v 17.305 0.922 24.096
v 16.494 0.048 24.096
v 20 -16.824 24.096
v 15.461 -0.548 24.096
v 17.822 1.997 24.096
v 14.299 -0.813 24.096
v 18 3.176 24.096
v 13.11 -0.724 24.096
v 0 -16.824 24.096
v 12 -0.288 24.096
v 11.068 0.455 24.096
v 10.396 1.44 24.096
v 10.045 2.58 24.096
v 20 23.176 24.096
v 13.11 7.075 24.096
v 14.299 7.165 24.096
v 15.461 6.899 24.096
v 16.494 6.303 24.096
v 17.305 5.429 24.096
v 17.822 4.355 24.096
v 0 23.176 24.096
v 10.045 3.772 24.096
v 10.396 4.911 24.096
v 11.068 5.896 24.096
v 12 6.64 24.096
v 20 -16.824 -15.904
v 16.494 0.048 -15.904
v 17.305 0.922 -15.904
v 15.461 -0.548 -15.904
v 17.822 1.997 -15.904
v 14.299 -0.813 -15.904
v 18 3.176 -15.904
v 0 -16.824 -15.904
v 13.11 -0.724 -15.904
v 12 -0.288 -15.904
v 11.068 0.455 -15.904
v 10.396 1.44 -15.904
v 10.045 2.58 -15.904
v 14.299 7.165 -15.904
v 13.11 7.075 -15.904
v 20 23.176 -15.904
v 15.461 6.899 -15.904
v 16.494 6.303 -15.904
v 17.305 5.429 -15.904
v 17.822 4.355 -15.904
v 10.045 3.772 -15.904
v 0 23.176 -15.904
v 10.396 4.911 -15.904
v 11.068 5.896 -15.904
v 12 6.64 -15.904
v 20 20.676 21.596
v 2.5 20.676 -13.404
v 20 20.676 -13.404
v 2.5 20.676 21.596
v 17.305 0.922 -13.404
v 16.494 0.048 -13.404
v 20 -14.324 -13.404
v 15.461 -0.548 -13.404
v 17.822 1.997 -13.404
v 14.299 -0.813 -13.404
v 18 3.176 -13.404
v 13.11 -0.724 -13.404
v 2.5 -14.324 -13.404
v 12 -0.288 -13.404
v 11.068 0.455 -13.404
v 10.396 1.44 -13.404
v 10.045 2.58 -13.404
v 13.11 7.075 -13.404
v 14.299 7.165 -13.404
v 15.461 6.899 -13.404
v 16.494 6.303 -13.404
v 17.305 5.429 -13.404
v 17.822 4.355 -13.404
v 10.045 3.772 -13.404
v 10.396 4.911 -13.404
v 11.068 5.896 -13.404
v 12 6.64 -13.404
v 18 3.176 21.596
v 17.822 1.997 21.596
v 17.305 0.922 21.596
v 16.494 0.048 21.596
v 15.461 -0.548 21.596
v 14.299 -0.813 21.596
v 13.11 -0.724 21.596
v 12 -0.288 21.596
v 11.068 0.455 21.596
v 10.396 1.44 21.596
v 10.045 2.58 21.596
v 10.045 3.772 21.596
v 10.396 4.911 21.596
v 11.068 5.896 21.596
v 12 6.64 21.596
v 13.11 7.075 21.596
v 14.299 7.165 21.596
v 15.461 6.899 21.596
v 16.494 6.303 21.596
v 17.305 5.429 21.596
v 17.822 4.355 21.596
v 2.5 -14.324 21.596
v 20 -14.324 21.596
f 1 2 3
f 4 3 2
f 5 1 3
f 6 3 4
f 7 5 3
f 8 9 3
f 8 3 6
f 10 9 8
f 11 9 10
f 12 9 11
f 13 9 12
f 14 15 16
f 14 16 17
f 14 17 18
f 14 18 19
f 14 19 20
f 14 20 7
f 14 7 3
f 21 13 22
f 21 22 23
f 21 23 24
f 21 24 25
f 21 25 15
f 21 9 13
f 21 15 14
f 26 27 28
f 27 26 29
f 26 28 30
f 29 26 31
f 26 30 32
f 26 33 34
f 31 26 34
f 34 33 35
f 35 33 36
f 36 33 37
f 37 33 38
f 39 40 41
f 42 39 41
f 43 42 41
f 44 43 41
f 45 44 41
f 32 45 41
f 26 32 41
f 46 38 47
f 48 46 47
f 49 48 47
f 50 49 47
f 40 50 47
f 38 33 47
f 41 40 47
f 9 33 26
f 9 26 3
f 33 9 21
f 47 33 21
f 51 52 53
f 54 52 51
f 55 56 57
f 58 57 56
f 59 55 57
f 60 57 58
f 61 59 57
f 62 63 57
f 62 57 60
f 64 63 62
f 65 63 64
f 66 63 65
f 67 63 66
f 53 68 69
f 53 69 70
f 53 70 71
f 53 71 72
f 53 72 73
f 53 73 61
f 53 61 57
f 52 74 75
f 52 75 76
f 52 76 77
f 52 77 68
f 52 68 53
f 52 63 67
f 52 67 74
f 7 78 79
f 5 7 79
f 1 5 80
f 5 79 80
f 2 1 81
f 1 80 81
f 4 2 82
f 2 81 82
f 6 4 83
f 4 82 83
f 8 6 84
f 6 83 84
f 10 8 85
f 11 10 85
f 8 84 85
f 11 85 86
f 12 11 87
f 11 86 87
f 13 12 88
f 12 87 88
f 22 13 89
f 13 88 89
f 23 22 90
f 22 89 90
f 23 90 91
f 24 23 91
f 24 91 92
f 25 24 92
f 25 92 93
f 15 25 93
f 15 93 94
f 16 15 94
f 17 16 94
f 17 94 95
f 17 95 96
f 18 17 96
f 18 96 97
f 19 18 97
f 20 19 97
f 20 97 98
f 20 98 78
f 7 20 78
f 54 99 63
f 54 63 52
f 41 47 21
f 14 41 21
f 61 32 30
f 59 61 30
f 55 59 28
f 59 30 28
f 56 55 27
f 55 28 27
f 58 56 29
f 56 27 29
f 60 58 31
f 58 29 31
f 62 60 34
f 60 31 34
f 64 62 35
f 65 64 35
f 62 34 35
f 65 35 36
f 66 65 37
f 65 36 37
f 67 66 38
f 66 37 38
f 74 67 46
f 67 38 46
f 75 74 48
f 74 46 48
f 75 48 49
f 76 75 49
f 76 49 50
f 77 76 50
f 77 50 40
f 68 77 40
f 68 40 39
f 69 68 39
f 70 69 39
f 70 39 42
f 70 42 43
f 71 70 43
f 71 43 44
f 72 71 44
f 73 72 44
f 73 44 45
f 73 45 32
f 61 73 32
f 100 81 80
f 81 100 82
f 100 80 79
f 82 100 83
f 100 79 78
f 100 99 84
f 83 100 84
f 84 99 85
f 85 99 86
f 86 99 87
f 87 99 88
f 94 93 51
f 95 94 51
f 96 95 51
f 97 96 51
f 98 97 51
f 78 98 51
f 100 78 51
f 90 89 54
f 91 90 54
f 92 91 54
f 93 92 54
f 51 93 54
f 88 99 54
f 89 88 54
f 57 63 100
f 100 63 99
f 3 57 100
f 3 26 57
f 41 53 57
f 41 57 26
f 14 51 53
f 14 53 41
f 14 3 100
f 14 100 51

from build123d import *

# Parameters (mm, degrees)
F0_W     = 40
F0_H     = 40
F1_DEPTH = 20
F2_T     = -2.5
F3_R     = 4
F4_DEPTH = 40.001


with BuildPart() as f1:
    # F0 (on Right) → F1 (new body)
    with BuildSketch(Plane.YZ):
        with Locations((3.175765, 4.096127)):
            Rectangle(F0_W, F0_H)
    extrude(amount=F1_DEPTH)

    # F2
    f2_openings = [f1.faces().sort_by_distance(p)[0] for p in [
        (20, 3.175765, 4.096127),
    ]]
    offset(amount=F2_T, openings=f2_openings)

    # F3 (on face) → F4 (cut, through all)
    with BuildSketch(Plane(origin=(0, 0, -15.903873), x_dir=(1, 0, 0), z_dir=(0, 0, -1))):
        with Locations((14, -3.175765)):
            Circle(F3_R)
    extrude(amount=-F4_DEPTH, mode=Mode.SUBTRACT)


solid = f1.part
